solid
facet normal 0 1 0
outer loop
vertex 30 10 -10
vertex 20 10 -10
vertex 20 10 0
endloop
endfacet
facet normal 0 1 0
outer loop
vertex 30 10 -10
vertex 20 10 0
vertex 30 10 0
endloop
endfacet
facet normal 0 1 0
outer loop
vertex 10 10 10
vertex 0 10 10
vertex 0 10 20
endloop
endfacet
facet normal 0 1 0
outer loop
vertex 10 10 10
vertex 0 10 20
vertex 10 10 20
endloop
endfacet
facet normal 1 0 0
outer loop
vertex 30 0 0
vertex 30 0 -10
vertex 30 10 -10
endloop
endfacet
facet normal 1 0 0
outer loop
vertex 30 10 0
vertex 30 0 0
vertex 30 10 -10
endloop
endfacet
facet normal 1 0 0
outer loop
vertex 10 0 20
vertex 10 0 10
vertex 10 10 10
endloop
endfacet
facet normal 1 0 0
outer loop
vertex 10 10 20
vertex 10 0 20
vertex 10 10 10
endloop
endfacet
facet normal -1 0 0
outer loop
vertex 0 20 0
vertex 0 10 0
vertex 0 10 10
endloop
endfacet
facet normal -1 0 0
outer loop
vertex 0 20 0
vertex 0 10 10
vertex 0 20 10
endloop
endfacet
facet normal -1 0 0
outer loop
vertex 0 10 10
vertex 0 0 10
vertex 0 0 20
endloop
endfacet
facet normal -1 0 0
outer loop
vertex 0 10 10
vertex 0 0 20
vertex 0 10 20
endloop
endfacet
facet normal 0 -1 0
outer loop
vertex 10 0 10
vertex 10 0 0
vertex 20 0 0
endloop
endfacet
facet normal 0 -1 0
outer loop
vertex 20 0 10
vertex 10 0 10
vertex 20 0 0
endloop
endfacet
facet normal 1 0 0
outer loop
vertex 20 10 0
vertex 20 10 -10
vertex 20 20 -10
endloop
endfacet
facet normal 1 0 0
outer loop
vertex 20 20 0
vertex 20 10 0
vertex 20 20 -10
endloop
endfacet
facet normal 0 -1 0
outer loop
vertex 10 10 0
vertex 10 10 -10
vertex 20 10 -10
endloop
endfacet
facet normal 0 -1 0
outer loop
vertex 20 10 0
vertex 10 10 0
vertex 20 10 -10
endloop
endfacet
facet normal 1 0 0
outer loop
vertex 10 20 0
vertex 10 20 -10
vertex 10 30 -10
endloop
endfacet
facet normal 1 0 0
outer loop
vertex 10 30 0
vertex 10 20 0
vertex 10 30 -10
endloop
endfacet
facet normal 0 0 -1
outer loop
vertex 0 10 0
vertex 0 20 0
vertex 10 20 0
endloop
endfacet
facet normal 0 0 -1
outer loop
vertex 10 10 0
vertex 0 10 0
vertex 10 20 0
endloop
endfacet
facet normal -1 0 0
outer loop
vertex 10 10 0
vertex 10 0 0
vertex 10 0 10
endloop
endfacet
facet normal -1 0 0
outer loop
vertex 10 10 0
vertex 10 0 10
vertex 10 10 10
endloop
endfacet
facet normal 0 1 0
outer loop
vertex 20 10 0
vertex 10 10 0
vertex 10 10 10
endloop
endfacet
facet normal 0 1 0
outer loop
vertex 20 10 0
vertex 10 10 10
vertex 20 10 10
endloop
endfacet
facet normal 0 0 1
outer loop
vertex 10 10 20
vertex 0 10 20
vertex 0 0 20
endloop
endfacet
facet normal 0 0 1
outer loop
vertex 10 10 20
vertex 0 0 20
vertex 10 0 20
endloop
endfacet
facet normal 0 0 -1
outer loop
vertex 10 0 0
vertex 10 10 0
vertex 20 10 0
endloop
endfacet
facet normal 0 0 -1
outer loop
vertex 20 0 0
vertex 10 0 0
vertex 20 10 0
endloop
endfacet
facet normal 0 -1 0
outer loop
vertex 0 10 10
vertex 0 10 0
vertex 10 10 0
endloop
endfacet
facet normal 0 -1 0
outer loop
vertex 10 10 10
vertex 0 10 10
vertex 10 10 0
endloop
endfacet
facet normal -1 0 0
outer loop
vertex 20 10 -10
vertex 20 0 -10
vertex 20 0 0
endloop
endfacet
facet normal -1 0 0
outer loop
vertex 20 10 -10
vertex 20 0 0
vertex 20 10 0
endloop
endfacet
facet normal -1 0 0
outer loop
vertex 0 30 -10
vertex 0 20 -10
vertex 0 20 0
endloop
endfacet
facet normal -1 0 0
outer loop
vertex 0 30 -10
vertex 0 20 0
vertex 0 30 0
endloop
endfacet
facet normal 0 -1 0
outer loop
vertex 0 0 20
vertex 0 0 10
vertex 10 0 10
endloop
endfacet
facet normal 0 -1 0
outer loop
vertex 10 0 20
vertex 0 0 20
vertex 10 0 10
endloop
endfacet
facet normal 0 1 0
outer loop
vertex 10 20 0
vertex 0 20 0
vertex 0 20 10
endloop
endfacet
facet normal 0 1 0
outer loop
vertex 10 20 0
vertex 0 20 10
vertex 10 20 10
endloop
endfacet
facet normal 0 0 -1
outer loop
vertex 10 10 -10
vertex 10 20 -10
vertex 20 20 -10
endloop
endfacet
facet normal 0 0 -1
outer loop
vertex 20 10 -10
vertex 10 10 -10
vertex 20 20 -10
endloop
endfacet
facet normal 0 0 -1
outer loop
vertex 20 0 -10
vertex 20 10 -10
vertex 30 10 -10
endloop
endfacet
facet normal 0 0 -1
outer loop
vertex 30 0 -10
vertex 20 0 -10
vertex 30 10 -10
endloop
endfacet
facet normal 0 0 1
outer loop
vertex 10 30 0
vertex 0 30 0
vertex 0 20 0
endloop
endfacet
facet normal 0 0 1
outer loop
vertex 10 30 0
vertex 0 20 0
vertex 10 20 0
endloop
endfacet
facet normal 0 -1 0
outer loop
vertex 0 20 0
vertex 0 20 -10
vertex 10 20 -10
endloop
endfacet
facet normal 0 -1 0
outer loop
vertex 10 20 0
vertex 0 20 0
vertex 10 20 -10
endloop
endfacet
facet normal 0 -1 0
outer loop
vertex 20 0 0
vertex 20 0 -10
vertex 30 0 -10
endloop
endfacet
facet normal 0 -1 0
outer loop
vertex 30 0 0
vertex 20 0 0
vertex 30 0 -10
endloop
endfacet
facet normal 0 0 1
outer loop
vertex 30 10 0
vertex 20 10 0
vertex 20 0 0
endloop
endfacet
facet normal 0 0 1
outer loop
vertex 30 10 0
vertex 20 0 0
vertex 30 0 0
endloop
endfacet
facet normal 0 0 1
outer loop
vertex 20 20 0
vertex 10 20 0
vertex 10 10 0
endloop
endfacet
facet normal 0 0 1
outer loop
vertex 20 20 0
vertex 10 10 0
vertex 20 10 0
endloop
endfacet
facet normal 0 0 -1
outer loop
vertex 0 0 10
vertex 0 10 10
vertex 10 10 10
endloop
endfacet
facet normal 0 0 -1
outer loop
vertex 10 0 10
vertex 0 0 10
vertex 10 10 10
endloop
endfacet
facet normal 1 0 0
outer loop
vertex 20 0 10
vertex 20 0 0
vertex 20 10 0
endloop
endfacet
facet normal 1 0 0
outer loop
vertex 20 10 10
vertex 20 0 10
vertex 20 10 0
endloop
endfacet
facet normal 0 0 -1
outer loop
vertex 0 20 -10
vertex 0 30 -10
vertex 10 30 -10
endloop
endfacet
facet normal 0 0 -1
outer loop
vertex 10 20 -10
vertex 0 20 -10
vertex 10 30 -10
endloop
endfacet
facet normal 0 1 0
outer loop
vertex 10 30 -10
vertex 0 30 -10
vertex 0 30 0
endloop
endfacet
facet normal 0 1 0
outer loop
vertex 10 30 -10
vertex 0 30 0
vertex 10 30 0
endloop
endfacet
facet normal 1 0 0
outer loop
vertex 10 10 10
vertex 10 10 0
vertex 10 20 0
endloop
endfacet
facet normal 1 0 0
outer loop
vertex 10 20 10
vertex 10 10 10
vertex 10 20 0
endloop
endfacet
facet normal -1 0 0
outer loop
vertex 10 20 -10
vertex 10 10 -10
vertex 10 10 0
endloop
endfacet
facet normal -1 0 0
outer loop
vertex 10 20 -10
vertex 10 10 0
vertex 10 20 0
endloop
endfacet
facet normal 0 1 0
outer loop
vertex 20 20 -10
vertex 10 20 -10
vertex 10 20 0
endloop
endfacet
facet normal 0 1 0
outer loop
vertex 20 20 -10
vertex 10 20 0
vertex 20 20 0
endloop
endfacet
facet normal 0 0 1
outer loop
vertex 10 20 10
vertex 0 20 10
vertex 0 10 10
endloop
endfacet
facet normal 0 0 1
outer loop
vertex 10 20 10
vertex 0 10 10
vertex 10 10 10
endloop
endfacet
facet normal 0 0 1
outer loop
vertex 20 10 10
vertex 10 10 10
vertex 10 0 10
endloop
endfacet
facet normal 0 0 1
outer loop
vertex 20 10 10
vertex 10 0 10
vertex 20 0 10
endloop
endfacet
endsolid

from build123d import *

# Parameters (mm, degrees)
BOX_W        = 10
BOX_H        = 10
BOX_DEPTH    = 10
BOX001_W     = 10
BOX001_H     = 10
BOX001_DEPTH = 10
BOX002_W     = 10
BOX002_H     = 10
BOX002_DEPTH = 10
BOX003_W     = 10
BOX003_H     = 10
BOX003_DEPTH = 10
BOX004_W     = 10
BOX004_H     = 10
BOX004_DEPTH = 10
BOX005_W     = 10
BOX005_H     = 10
BOX005_DEPTH = 10


with BuildPart() as cub:
    # Box → Box (new body)
    with BuildSketch(Plane.XY.offset(10)):
        with Locations((5, 5)):
            Rectangle(BOX_W, BOX_H)
    extrude(amount=BOX_DEPTH)


with BuildPart() as cub001:
    # Box001 → Box001 (new body)
    with BuildSketch(Plane(origin=(10, 0, 0), x_dir=(1, 0, 0), z_dir=(0, 0, 1))):
        with Locations((5, 5)):
            Rectangle(BOX001_W, BOX001_H)
    extrude(amount=BOX001_DEPTH)


with BuildPart() as cub002:
    # Box002 → Box002 (new body)
    with BuildSketch(Plane(origin=(0, 10, 0), x_dir=(1, 0, 0), z_dir=(0, 0, 1))):
        with Locations((5, 5)):
            Rectangle(BOX002_W, BOX002_H)
    extrude(amount=BOX002_DEPTH)


with BuildPart() as cub003:
    # Box003 → Box003 (new body)
    with BuildSketch(Plane(origin=(20, 0, -10), x_dir=(1, 0, 0), z_dir=(0, 0, 1))):
        with Locations((5, 5)):
            Rectangle(BOX003_W, BOX003_H)
    extrude(amount=BOX003_DEPTH)


with BuildPart() as cub004:
    # Box004 → Box004 (new body)
    with BuildSketch(Plane(origin=(10, 10, -10), x_dir=(1, 0, 0), z_dir=(0, 0, 1))):
        with Locations((5, 5)):
            Rectangle(BOX004_W, BOX004_H)
    extrude(amount=BOX004_DEPTH)


with BuildPart() as cub005:
    # Box005 → Box005 (new body)
    with BuildSketch(Plane(origin=(0, 20, -10), x_dir=(1, 0, 0), z_dir=(0, 0, 1))):
        with Locations((5, 5)):
            Rectangle(BOX005_W, BOX005_H)
    extrude(amount=BOX005_DEPTH)


solid = Compound([cub.part, cub001.part, cub002.part, cub003.part, cub004.part, cub005.part])
